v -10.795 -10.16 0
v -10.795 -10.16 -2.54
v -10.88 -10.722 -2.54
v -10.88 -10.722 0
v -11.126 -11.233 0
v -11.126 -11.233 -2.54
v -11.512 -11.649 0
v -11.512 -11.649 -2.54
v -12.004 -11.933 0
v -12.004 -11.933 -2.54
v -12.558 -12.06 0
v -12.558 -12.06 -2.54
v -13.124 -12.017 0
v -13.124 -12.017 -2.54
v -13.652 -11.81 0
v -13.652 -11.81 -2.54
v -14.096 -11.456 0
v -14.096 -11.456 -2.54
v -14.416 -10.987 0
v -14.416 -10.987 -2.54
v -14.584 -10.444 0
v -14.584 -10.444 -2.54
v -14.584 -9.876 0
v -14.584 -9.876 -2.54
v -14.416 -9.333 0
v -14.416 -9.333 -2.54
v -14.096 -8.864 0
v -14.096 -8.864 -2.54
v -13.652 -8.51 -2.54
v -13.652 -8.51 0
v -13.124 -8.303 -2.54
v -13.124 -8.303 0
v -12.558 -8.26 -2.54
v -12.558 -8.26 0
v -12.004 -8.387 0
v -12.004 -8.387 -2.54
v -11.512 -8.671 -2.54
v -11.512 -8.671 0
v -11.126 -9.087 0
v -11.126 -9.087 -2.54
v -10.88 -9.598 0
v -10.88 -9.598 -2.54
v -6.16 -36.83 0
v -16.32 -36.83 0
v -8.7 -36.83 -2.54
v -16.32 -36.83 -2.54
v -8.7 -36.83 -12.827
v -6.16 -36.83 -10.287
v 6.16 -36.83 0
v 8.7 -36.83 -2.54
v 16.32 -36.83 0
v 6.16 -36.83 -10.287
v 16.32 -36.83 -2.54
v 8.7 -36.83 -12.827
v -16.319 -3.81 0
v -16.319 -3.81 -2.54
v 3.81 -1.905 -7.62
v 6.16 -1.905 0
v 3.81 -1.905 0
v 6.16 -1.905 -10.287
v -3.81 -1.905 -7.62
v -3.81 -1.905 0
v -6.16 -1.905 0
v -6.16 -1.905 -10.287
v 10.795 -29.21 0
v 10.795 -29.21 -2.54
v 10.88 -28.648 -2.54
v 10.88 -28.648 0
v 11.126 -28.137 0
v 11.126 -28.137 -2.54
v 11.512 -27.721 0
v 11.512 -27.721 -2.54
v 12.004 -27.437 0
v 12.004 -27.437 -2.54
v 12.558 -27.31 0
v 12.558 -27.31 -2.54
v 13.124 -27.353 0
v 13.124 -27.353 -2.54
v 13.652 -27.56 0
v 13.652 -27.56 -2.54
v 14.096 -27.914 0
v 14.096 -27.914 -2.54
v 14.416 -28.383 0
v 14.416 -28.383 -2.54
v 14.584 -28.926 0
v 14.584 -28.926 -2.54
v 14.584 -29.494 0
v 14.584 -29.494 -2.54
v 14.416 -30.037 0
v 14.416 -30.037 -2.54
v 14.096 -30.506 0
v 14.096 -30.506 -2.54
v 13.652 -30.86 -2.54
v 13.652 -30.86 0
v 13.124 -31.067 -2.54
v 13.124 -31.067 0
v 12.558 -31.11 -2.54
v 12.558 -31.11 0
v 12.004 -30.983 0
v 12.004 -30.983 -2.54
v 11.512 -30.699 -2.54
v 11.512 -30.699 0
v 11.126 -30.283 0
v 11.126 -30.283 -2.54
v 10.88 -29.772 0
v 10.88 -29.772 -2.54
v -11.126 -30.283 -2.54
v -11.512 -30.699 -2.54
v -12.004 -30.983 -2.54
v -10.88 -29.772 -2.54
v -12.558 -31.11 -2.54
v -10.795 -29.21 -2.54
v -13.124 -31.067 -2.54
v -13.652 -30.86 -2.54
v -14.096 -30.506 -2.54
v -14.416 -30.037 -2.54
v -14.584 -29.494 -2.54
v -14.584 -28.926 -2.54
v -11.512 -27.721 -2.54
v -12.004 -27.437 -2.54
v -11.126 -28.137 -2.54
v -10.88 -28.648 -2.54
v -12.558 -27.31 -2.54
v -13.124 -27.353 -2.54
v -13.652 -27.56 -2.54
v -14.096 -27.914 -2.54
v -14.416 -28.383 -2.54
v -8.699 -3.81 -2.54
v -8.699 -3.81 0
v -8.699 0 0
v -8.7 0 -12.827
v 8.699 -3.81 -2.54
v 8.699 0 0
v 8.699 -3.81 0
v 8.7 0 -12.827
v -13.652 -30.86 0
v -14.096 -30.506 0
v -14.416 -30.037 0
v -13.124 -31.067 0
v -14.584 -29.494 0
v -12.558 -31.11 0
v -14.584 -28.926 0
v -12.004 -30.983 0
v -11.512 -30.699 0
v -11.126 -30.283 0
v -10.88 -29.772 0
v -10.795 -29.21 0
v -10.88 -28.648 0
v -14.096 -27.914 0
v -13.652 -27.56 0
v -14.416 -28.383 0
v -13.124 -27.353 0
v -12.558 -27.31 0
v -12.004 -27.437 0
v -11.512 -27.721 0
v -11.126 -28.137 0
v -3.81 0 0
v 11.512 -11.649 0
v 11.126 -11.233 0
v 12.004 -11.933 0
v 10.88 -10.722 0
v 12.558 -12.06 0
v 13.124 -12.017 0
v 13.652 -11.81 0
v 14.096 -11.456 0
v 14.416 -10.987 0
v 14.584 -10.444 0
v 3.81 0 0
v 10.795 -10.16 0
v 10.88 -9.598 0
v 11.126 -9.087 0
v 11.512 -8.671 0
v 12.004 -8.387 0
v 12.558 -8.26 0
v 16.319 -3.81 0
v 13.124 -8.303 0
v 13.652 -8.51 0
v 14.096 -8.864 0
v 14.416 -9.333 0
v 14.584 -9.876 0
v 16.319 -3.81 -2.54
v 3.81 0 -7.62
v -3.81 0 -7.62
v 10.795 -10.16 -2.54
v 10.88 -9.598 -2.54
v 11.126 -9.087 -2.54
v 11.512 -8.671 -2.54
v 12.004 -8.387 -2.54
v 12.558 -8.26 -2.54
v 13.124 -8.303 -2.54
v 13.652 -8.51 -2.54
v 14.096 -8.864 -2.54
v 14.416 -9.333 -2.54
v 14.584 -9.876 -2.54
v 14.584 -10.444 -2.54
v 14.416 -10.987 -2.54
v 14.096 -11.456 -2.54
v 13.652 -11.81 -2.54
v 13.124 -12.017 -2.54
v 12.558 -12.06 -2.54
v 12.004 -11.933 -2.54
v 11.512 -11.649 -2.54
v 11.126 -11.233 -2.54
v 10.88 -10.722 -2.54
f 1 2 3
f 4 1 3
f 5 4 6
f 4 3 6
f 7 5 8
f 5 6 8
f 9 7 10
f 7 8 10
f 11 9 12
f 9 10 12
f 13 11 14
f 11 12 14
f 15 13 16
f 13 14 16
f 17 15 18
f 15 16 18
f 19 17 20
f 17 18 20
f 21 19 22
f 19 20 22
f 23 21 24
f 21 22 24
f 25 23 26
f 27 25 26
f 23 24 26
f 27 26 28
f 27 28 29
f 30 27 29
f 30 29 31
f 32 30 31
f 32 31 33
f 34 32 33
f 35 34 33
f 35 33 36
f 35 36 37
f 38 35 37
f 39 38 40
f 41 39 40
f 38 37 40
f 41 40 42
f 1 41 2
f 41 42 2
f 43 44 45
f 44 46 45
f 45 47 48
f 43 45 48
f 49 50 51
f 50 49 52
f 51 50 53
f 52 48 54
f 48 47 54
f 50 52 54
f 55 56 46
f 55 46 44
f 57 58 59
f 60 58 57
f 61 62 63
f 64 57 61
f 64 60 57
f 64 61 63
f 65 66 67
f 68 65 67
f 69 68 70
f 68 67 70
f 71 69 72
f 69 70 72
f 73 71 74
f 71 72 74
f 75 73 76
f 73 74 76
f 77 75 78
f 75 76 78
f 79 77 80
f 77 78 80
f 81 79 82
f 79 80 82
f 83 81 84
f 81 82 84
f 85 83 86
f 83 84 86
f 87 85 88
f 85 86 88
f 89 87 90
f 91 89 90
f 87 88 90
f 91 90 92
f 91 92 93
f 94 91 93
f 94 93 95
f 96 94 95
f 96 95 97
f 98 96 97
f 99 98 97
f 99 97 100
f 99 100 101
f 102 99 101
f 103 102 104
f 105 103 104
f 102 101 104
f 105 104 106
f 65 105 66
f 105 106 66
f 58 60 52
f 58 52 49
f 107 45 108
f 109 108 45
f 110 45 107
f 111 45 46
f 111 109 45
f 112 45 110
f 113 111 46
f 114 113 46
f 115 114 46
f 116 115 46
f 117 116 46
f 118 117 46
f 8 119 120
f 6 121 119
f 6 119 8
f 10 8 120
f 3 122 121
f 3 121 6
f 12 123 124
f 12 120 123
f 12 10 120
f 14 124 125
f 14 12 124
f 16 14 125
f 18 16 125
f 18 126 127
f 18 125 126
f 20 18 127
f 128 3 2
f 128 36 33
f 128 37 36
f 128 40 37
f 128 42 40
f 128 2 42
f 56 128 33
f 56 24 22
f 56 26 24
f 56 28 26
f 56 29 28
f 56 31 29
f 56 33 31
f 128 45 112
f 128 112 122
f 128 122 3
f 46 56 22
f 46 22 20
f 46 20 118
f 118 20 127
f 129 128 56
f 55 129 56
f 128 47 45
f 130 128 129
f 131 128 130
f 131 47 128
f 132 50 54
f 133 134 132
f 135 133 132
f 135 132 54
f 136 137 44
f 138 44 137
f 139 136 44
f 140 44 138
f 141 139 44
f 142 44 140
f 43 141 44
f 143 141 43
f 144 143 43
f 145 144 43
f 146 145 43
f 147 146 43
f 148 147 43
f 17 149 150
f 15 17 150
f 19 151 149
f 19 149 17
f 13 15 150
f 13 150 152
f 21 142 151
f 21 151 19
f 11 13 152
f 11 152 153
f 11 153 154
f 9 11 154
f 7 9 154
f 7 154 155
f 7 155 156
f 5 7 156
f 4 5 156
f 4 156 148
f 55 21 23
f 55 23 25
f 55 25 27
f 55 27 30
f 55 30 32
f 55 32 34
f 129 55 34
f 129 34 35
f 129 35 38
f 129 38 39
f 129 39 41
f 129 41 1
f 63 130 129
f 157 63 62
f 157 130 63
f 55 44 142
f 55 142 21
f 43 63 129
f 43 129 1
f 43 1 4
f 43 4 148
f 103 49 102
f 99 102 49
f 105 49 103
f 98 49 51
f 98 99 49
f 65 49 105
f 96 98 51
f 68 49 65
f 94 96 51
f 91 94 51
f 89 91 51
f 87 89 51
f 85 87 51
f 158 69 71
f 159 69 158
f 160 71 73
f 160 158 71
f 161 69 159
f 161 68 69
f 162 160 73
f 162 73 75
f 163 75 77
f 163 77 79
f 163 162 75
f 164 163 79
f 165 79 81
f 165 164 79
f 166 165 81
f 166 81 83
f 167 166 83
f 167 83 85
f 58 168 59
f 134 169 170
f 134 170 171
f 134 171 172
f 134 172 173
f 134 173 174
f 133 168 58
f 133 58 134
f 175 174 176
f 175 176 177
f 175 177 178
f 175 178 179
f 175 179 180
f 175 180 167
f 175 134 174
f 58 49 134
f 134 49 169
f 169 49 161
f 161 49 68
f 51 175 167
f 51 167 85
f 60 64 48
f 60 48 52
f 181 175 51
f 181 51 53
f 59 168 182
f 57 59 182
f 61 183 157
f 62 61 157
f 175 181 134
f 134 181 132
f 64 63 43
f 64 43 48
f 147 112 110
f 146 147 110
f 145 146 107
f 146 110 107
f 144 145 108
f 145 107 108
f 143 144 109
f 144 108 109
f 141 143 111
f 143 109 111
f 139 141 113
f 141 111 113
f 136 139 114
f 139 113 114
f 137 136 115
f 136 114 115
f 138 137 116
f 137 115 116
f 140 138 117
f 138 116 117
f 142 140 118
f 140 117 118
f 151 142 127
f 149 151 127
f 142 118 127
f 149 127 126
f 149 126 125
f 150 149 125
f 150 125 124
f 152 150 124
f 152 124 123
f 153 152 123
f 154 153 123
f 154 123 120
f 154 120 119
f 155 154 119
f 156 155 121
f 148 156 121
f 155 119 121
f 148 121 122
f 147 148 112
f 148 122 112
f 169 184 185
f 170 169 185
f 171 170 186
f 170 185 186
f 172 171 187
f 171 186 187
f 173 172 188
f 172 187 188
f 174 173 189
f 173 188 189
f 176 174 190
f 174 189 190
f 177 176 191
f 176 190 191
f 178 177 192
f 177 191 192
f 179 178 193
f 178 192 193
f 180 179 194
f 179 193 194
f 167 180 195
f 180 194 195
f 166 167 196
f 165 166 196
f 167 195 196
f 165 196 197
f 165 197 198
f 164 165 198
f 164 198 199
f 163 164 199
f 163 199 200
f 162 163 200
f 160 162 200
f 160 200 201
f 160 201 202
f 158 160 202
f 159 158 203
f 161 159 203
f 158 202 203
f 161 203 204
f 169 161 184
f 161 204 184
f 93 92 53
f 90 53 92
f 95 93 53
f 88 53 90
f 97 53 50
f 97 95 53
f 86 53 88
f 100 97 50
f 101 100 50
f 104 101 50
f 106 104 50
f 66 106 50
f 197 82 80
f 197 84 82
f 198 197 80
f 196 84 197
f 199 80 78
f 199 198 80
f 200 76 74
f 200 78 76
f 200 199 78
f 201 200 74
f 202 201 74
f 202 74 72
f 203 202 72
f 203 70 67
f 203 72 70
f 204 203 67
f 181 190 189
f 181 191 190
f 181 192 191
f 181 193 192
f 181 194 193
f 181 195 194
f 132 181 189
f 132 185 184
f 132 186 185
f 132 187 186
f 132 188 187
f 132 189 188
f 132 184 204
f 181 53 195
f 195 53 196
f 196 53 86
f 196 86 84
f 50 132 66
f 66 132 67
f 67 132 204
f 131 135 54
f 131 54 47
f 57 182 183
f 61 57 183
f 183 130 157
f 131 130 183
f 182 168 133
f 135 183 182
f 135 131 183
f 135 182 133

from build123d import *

# Parameters (mm, degrees)
BOSS_EXTRUDE1_DEPTH = 36.83
BOSS_EXTRUDE2_DEPTH = 1.905
SKETCH3_R           = 1.905
CUT_EXTRUDE1_DEPTH  = 2.54
SKETCH4_W           = 7.62
SKETCH4_H           = 3.81
CUT_EXTRUDE2_DEPTH  = 42.576403756


with BuildPart() as part:
    # Sketch1 → Boss-Extrude1 (new body)
    with BuildSketch(Plane(origin=(0, 0, 0), x_dir=(1, 0, 0), z_dir=(0, 1, 0))):
        Polygon((-16.3195, 0), (-6.1595, 0), (-6.1595, 10.287), (0, 10.287), (6.1595, 10.287), (6.1595, 0), (16.3195, 0), (16.3195, 2.54), (8.6995, 2.54), (8.6995, 12.827), (0, 12.827), (-8.6995, 12.827), (-8.6995, 2.54), (-16.3195, 2.54), align=None)
    extrude(amount=-BOSS_EXTRUDE1_DEPTH)

    # Sketch2 → Boss-Extrude2 (add)
    with BuildSketch(Plane(origin=(0, 0, 0), x_dir=(1, 0, 0), z_dir=(0, 1, 0))):
        Polygon((-8.6995, 12.827), (8.6995, 12.827), (8.6995, 0), (3.81, 0), (3.81, 7.62), (-3.81, 7.62), (-3.81, 0), (-8.6995, 0), align=None)
    extrude(amount=-BOSS_EXTRUDE2_DEPTH)

    # Sketch3 → Cut-Extrude1 (cut)
    with BuildSketch(Plane(origin=(0, 0, -2.54), x_dir=(-1, 0, 0), z_dir=(0, 0, -1))):
        with Locations((-12.7, -10.16)):
            Circle(SKETCH3_R)
        with Locations((-12.7, -29.21)):
            Circle(SKETCH3_R)
        with Locations(Location((12.7, -29.21, 0), (0, 0, 180))):
            Circle(SKETCH3_R)
        with Locations(Location((12.7, -10.16, 0), (0, 0, 180))):
            Circle(SKETCH3_R)
    extrude(amount=-CUT_EXTRUDE1_DEPTH, mode=Mode.SUBTRACT)

    # Sketch4 → Cut-Extrude2 (cut, through all)
    with BuildSketch(Plane(origin=(0, 0, -2.54), x_dir=(-1, 0, 0), z_dir=(0, 0, -1))):
        with Locations((-12.5095, -1.905)):
            Rectangle(SKETCH4_W, SKETCH4_H)
        with Locations((12.5095, -1.905)):
            Rectangle(SKETCH4_W, SKETCH4_H)
    extrude(amount=-CUT_EXTRUDE2_DEPTH, mode=Mode.SUBTRACT)


solid = part.part
